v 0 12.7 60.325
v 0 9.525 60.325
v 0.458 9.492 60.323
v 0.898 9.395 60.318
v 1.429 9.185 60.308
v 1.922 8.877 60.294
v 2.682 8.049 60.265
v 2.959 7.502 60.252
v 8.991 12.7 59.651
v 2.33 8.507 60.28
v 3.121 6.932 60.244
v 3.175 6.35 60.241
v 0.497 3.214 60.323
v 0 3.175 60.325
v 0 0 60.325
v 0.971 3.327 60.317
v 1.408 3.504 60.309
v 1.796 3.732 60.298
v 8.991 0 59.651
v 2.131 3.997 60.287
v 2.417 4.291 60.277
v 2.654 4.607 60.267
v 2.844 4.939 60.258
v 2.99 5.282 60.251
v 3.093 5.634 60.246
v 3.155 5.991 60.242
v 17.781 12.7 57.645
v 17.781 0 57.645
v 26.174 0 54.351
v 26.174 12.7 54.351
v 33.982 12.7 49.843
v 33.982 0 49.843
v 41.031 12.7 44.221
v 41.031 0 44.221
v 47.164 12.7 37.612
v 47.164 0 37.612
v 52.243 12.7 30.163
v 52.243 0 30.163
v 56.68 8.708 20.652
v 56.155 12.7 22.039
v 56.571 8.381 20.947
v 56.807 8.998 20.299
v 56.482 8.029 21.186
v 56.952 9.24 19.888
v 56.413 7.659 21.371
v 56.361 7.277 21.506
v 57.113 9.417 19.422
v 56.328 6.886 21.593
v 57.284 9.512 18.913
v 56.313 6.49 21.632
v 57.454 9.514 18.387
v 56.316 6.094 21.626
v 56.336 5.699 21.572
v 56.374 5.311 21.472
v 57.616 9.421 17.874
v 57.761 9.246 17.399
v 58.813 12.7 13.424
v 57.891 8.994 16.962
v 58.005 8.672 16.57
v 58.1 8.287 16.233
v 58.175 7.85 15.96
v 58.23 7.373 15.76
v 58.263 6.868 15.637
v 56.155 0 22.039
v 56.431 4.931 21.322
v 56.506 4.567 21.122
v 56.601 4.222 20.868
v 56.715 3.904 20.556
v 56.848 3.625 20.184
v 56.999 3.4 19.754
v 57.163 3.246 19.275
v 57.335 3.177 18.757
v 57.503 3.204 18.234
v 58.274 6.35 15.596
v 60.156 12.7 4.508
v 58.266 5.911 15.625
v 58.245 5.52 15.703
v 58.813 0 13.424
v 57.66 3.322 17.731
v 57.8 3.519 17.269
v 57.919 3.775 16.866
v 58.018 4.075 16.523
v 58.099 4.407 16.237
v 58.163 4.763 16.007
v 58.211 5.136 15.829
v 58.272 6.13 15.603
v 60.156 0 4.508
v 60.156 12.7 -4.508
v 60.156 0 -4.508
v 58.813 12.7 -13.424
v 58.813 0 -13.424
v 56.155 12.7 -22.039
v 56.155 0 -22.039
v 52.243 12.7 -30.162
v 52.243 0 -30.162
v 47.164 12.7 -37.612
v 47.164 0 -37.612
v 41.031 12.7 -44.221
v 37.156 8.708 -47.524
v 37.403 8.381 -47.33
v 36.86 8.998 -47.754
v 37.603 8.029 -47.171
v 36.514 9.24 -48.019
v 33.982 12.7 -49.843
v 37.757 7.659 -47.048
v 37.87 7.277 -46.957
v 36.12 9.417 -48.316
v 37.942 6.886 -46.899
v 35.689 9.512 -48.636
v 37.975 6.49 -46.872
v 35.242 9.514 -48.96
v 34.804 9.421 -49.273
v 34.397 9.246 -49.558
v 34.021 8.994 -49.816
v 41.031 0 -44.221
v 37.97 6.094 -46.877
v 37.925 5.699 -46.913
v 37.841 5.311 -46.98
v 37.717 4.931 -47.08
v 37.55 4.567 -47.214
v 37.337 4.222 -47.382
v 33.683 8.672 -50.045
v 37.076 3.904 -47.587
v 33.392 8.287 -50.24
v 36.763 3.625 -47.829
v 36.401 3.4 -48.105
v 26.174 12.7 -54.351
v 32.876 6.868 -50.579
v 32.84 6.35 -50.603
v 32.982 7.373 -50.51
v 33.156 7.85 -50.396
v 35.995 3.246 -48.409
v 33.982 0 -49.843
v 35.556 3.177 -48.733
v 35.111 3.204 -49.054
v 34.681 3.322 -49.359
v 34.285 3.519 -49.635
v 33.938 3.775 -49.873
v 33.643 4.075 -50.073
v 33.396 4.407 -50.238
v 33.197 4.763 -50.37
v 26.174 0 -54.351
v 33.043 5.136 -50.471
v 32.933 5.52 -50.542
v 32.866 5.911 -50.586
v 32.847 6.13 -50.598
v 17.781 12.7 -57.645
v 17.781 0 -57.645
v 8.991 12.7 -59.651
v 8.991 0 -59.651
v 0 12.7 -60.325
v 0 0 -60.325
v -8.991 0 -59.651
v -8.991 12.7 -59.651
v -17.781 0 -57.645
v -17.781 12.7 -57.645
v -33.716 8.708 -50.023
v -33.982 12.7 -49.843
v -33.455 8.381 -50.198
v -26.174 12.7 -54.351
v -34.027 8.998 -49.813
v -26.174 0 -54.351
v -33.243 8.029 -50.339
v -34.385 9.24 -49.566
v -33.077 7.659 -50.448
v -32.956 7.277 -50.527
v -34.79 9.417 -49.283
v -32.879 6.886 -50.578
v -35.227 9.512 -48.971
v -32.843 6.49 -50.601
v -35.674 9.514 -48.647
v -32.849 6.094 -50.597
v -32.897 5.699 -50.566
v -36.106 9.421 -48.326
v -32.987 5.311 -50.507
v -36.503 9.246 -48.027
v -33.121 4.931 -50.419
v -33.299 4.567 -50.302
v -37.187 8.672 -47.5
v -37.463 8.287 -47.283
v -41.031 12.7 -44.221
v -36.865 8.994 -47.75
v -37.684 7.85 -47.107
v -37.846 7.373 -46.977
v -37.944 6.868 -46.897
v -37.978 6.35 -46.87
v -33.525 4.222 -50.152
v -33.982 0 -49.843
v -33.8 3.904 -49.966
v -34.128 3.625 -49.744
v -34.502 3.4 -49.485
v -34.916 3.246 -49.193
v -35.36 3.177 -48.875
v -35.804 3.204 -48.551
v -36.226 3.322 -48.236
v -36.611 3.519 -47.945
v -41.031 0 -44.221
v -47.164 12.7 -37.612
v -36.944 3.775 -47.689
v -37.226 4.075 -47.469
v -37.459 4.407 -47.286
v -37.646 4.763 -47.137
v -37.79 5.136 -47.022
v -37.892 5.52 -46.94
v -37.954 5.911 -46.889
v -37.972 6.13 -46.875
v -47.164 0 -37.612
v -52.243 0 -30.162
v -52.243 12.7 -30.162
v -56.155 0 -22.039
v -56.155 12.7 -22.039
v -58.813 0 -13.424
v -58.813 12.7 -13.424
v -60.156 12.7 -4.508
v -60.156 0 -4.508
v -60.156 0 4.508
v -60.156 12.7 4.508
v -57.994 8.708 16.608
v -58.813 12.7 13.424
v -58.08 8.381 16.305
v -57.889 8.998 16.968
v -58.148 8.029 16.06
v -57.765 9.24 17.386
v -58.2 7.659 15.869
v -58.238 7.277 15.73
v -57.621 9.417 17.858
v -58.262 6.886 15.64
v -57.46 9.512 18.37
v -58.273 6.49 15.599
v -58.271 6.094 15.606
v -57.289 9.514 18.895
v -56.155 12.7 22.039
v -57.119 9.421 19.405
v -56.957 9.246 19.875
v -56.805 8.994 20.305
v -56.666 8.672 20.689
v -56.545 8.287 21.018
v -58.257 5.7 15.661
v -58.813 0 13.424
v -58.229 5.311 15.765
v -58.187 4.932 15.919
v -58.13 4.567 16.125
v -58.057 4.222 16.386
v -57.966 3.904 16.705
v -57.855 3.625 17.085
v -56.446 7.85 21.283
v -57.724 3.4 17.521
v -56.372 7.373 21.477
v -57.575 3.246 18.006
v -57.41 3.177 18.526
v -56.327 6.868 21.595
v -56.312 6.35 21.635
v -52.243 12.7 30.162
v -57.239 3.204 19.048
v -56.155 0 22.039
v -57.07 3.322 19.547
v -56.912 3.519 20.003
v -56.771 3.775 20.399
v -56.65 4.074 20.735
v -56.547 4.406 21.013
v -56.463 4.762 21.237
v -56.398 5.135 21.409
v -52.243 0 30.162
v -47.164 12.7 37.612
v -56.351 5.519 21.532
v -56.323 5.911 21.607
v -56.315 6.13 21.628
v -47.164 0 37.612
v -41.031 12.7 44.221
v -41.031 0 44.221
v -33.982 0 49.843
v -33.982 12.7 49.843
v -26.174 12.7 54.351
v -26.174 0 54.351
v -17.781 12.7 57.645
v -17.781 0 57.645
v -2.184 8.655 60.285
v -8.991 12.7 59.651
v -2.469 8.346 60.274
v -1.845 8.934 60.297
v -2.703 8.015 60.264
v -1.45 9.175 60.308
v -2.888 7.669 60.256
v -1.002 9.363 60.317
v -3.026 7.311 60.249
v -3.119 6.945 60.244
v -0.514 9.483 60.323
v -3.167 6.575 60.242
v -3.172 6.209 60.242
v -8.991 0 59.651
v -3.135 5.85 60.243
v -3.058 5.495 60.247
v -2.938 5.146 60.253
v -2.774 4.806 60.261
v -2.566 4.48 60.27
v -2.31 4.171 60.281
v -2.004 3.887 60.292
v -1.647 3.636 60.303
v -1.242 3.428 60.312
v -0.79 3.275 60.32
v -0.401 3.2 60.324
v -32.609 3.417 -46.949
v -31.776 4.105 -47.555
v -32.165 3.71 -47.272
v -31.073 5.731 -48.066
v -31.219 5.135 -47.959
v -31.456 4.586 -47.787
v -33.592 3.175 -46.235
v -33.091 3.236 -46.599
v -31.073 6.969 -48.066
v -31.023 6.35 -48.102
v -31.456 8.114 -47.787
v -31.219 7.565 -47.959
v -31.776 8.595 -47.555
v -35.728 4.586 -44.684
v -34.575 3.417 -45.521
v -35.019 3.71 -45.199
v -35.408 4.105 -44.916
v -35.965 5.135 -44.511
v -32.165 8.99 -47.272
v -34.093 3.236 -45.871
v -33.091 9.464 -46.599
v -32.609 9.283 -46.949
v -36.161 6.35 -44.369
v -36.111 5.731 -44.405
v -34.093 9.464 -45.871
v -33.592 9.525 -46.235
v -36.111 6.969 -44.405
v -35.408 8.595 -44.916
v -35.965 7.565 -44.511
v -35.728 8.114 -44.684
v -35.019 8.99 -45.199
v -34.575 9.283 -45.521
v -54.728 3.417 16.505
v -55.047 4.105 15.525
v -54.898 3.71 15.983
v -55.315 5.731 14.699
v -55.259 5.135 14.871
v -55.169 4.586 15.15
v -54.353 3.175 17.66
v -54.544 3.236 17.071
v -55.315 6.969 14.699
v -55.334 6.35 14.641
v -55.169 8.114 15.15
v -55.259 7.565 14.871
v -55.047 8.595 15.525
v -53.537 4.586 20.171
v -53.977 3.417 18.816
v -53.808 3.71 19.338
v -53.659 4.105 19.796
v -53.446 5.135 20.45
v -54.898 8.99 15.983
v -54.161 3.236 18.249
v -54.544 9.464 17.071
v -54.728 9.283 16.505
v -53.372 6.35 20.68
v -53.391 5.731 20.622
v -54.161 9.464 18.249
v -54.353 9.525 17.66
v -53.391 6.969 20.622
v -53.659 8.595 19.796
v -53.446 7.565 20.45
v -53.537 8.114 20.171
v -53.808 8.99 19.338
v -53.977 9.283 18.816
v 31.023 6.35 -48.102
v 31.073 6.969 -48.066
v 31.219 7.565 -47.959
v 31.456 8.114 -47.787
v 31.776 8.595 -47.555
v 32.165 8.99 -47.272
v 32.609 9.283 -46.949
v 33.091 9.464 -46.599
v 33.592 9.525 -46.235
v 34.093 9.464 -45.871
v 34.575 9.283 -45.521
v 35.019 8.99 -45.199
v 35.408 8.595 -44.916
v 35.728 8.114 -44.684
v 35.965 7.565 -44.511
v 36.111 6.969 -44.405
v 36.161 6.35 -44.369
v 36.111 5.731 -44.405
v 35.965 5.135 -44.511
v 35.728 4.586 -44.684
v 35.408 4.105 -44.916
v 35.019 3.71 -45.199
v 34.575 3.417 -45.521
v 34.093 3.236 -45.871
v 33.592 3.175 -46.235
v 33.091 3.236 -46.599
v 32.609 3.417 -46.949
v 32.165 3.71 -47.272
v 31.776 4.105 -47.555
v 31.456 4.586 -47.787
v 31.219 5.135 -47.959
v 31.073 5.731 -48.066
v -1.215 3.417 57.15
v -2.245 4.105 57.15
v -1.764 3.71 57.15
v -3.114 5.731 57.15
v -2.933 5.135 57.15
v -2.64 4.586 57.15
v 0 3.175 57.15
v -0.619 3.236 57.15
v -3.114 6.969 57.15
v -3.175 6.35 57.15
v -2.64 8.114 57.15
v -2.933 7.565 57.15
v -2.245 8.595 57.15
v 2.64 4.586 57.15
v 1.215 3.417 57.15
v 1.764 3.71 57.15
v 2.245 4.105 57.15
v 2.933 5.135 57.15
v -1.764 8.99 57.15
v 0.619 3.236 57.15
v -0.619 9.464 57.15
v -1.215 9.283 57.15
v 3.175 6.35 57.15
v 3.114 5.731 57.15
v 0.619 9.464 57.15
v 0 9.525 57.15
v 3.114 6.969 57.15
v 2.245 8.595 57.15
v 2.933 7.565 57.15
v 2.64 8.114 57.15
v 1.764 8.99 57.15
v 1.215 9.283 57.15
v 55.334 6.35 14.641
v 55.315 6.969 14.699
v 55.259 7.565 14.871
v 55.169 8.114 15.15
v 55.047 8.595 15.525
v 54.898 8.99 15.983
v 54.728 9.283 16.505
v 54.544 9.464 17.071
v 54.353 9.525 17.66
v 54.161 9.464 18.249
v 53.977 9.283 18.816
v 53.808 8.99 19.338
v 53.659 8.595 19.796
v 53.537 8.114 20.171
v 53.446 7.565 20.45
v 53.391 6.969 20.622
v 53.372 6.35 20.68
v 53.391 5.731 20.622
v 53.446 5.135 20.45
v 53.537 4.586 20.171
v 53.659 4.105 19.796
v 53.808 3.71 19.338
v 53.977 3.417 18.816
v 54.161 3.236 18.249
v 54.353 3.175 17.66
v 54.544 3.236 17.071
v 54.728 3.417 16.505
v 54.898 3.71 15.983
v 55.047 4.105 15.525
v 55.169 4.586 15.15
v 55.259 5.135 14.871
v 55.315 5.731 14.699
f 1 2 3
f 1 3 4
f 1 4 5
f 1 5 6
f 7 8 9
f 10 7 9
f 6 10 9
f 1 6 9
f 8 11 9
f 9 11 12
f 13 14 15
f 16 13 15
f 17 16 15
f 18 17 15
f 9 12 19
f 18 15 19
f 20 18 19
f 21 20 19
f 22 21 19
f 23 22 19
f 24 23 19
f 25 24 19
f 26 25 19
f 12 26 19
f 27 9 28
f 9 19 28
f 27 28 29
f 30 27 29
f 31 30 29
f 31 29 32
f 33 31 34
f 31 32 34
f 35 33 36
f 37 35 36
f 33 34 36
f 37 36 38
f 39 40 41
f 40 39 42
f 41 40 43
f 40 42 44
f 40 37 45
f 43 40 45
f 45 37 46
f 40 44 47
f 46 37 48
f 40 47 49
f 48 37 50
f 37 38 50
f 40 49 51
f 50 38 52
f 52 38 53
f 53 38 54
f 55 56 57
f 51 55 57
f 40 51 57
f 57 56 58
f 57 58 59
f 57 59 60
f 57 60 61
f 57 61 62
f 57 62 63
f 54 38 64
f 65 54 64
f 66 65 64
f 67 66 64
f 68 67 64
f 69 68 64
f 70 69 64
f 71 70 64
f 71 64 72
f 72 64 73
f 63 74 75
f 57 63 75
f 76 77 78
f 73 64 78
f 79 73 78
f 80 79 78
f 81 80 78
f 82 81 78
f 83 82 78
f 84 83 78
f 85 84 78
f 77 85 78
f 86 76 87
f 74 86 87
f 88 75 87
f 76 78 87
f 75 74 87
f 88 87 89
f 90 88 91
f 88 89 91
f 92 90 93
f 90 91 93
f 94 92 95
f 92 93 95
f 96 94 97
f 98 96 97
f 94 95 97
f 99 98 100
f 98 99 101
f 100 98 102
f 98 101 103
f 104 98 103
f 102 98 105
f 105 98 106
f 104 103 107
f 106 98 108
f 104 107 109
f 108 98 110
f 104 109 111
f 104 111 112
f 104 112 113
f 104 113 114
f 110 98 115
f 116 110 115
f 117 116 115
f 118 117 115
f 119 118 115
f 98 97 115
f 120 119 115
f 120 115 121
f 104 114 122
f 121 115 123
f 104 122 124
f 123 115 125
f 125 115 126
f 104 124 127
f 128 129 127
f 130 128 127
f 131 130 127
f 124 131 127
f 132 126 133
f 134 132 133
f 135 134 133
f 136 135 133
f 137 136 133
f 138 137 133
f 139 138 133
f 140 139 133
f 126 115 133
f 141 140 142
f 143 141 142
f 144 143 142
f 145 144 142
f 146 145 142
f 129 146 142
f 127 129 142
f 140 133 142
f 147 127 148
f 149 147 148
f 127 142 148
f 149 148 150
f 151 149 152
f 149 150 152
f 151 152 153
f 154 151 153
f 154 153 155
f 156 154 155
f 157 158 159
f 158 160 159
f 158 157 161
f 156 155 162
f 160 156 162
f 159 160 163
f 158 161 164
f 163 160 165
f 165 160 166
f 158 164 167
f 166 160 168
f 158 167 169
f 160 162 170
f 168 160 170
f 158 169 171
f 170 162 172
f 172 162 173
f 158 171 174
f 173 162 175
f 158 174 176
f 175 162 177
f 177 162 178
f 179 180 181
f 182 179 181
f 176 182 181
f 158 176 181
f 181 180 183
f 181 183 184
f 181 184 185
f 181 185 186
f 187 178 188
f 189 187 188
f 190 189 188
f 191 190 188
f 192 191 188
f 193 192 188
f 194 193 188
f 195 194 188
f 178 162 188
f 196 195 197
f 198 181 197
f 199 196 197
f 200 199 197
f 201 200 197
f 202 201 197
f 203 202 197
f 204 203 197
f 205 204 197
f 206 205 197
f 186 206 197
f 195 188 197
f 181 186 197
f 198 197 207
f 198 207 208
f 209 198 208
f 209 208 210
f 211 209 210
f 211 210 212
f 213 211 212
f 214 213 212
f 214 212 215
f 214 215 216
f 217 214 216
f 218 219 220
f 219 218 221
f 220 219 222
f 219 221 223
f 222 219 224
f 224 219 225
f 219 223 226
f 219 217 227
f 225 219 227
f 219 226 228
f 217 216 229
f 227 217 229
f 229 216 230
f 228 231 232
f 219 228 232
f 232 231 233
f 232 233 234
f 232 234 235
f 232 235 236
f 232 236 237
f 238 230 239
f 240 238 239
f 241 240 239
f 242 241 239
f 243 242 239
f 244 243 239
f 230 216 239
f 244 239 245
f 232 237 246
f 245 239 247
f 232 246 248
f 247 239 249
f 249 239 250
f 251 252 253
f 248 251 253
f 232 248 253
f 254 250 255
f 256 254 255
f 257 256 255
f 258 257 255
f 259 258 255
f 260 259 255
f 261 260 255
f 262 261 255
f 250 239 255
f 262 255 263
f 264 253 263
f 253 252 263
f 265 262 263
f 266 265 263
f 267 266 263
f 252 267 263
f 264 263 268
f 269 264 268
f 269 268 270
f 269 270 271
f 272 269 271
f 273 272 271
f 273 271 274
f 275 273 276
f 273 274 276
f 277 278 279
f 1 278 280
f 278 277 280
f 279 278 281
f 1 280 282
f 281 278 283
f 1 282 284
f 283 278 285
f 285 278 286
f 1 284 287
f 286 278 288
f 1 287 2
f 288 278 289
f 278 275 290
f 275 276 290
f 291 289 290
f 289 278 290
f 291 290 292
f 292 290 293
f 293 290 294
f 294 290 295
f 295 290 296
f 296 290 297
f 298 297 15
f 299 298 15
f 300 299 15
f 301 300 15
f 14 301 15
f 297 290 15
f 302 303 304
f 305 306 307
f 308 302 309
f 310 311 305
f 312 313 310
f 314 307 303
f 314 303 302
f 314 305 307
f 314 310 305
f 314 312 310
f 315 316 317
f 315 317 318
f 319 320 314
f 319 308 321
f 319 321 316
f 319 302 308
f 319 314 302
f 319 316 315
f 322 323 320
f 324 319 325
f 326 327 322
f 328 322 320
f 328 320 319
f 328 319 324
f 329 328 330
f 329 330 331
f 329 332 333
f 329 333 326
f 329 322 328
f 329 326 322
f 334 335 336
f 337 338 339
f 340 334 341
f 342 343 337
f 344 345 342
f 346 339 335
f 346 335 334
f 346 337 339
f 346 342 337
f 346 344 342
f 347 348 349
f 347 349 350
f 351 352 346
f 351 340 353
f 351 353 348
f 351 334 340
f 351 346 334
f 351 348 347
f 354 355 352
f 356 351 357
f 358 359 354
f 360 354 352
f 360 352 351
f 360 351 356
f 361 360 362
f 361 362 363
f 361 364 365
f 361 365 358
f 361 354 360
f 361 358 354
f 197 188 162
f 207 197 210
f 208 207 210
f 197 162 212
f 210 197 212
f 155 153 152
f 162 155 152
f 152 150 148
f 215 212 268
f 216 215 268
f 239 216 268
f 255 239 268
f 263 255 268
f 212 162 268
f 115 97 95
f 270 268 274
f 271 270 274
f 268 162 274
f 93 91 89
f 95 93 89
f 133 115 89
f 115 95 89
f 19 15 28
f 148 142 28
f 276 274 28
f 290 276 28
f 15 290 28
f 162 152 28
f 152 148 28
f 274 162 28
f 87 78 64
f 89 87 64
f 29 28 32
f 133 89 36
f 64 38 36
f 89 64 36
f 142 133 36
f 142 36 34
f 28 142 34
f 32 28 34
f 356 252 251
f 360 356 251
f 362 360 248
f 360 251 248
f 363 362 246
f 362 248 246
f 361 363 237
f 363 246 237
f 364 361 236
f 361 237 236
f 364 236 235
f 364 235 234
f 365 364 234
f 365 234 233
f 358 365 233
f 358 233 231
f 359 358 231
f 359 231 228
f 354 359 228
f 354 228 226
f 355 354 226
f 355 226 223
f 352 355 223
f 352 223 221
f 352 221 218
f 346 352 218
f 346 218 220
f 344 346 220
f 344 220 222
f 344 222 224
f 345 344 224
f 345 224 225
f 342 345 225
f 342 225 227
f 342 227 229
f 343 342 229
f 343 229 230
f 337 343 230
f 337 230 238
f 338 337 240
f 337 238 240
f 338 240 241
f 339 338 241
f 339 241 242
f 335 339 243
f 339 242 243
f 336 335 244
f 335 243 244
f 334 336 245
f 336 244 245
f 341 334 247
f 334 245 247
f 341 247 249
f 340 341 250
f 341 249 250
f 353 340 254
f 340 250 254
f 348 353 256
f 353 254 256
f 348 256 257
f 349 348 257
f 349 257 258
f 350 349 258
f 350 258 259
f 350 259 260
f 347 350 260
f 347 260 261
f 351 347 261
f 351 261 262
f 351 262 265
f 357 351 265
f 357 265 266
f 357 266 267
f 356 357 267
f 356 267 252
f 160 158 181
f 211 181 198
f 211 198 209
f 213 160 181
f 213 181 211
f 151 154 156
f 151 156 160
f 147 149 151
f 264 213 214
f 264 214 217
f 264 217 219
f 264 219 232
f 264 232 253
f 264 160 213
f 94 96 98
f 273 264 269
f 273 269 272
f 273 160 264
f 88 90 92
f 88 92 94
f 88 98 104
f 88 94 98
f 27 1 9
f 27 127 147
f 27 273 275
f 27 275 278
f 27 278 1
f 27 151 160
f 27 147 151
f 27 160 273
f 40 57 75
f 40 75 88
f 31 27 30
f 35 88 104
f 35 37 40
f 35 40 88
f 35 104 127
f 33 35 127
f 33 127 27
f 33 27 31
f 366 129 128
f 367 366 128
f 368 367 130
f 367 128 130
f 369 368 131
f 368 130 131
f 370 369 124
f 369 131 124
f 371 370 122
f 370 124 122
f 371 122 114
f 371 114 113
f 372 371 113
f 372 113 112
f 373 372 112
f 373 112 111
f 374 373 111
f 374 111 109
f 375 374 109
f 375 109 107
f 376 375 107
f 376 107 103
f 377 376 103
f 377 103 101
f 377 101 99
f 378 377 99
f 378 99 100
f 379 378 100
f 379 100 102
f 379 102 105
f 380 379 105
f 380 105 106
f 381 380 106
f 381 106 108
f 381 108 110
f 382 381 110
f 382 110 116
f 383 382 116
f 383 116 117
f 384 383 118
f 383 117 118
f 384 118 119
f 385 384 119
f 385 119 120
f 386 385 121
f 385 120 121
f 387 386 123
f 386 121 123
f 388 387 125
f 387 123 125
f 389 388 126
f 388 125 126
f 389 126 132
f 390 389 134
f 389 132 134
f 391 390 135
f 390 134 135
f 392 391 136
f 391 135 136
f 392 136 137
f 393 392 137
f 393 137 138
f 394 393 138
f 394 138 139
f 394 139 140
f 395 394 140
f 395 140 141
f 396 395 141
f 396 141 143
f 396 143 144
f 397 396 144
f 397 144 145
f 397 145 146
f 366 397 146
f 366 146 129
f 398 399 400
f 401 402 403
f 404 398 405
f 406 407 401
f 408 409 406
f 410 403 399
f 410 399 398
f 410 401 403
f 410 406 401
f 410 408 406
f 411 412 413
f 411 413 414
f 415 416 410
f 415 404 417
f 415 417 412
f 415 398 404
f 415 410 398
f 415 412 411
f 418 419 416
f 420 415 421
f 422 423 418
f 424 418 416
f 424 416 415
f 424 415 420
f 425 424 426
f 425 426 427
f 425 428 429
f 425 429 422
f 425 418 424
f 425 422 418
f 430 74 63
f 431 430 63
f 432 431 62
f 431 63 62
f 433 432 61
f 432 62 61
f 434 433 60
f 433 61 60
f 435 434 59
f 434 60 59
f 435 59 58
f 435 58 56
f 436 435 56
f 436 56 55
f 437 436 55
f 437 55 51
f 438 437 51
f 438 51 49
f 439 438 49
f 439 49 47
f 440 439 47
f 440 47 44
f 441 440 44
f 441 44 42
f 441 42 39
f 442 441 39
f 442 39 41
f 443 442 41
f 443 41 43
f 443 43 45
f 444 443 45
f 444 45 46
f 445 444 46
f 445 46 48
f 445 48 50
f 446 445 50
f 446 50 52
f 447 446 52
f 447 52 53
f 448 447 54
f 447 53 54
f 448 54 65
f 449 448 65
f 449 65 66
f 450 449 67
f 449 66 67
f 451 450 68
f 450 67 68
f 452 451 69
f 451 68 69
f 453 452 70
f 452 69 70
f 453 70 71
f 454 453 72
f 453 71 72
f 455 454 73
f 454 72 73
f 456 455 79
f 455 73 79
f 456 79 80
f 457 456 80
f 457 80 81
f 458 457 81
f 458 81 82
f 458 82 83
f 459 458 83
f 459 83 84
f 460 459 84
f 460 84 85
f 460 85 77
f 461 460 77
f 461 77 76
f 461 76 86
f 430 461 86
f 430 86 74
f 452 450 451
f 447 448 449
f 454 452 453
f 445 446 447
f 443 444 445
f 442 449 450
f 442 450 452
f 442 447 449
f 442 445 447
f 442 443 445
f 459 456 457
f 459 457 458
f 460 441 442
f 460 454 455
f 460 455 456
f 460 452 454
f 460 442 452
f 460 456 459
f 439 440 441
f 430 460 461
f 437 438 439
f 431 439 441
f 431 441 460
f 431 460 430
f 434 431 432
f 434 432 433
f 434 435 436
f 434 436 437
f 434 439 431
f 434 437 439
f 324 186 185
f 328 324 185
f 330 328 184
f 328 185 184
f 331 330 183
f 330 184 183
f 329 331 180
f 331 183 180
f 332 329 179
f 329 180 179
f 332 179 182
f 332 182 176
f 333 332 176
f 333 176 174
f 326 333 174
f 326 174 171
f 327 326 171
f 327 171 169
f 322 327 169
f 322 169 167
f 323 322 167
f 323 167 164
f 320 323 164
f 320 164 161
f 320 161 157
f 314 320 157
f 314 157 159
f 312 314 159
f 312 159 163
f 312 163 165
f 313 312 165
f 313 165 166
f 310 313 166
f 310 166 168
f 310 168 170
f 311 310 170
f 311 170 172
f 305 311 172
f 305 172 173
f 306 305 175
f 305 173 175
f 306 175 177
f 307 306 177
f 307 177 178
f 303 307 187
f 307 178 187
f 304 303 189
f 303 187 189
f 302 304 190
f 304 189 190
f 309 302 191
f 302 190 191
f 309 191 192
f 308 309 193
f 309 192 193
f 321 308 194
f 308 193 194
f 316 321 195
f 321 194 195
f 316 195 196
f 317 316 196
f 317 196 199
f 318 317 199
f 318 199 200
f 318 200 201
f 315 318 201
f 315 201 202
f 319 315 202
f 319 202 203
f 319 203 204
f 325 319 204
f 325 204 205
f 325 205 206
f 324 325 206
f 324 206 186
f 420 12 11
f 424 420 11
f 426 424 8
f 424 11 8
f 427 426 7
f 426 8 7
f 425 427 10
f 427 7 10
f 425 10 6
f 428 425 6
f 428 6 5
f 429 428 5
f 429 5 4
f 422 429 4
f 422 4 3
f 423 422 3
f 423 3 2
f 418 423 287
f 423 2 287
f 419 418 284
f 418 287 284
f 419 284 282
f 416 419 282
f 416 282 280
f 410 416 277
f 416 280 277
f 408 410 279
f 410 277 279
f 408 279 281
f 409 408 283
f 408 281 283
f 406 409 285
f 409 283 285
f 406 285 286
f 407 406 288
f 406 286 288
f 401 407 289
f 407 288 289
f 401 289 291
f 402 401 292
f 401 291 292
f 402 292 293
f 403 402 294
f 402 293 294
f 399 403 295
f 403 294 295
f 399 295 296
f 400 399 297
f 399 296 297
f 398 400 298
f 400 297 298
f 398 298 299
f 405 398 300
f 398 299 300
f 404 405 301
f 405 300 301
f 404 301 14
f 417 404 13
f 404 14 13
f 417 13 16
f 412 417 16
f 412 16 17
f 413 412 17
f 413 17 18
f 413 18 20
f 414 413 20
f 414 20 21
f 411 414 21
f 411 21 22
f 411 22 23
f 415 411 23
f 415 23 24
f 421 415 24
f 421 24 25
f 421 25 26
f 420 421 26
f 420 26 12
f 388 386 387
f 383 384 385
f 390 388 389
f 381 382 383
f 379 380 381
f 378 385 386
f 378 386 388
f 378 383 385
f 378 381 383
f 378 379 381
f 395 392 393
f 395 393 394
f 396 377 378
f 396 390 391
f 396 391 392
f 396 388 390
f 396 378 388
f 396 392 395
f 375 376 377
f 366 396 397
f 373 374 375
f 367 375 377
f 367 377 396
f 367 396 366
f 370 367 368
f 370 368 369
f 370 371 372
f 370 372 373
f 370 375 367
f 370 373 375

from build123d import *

# Parameters (mm, degrees)
SKETCH1_R           = 60.325
BOSS_EXTRUDE1_DEPTH = 12.7
SKETCH2_R           = 3.175
CUT_EXTRUDE1_DEPTH  = 19.05
CRVPATTERN1_COUNT   = 5


with BuildPart() as part:
    # Sketch1 → Boss-Extrude1 (new body)
    with BuildSketch(Plane(origin=(0, 0, 0), x_dir=(1, 0, 0), z_dir=(0, 1, 0))):
        with Locations(Location((0, 0, 0), (0, 0, 270))):
            Circle(SKETCH1_R)
    extrude(amount=BOSS_EXTRUDE1_DEPTH)

    # Sketch2 → Cut-Extrude1 (cut)
    with BuildSketch(Plane.XY.offset(76.2)):
        with Locations((0, 6.35)):
            Circle(SKETCH2_R)
    cut_extrude1 = extrude(amount=-CUT_EXTRUDE1_DEPTH, mode=Mode.SUBTRACT)

    # CrvPattern1: Cut-Extrude1 ×5 about axis
    crvpattern1_axis = Axis((0, 12.7, 0), (0, -1, 0))
    for i in range(1, CRVPATTERN1_COUNT):
        add(cut_extrude1.rotate(crvpattern1_axis, i * 360 / CRVPATTERN1_COUNT), mode=Mode.SUBTRACT)


solid = part.part
